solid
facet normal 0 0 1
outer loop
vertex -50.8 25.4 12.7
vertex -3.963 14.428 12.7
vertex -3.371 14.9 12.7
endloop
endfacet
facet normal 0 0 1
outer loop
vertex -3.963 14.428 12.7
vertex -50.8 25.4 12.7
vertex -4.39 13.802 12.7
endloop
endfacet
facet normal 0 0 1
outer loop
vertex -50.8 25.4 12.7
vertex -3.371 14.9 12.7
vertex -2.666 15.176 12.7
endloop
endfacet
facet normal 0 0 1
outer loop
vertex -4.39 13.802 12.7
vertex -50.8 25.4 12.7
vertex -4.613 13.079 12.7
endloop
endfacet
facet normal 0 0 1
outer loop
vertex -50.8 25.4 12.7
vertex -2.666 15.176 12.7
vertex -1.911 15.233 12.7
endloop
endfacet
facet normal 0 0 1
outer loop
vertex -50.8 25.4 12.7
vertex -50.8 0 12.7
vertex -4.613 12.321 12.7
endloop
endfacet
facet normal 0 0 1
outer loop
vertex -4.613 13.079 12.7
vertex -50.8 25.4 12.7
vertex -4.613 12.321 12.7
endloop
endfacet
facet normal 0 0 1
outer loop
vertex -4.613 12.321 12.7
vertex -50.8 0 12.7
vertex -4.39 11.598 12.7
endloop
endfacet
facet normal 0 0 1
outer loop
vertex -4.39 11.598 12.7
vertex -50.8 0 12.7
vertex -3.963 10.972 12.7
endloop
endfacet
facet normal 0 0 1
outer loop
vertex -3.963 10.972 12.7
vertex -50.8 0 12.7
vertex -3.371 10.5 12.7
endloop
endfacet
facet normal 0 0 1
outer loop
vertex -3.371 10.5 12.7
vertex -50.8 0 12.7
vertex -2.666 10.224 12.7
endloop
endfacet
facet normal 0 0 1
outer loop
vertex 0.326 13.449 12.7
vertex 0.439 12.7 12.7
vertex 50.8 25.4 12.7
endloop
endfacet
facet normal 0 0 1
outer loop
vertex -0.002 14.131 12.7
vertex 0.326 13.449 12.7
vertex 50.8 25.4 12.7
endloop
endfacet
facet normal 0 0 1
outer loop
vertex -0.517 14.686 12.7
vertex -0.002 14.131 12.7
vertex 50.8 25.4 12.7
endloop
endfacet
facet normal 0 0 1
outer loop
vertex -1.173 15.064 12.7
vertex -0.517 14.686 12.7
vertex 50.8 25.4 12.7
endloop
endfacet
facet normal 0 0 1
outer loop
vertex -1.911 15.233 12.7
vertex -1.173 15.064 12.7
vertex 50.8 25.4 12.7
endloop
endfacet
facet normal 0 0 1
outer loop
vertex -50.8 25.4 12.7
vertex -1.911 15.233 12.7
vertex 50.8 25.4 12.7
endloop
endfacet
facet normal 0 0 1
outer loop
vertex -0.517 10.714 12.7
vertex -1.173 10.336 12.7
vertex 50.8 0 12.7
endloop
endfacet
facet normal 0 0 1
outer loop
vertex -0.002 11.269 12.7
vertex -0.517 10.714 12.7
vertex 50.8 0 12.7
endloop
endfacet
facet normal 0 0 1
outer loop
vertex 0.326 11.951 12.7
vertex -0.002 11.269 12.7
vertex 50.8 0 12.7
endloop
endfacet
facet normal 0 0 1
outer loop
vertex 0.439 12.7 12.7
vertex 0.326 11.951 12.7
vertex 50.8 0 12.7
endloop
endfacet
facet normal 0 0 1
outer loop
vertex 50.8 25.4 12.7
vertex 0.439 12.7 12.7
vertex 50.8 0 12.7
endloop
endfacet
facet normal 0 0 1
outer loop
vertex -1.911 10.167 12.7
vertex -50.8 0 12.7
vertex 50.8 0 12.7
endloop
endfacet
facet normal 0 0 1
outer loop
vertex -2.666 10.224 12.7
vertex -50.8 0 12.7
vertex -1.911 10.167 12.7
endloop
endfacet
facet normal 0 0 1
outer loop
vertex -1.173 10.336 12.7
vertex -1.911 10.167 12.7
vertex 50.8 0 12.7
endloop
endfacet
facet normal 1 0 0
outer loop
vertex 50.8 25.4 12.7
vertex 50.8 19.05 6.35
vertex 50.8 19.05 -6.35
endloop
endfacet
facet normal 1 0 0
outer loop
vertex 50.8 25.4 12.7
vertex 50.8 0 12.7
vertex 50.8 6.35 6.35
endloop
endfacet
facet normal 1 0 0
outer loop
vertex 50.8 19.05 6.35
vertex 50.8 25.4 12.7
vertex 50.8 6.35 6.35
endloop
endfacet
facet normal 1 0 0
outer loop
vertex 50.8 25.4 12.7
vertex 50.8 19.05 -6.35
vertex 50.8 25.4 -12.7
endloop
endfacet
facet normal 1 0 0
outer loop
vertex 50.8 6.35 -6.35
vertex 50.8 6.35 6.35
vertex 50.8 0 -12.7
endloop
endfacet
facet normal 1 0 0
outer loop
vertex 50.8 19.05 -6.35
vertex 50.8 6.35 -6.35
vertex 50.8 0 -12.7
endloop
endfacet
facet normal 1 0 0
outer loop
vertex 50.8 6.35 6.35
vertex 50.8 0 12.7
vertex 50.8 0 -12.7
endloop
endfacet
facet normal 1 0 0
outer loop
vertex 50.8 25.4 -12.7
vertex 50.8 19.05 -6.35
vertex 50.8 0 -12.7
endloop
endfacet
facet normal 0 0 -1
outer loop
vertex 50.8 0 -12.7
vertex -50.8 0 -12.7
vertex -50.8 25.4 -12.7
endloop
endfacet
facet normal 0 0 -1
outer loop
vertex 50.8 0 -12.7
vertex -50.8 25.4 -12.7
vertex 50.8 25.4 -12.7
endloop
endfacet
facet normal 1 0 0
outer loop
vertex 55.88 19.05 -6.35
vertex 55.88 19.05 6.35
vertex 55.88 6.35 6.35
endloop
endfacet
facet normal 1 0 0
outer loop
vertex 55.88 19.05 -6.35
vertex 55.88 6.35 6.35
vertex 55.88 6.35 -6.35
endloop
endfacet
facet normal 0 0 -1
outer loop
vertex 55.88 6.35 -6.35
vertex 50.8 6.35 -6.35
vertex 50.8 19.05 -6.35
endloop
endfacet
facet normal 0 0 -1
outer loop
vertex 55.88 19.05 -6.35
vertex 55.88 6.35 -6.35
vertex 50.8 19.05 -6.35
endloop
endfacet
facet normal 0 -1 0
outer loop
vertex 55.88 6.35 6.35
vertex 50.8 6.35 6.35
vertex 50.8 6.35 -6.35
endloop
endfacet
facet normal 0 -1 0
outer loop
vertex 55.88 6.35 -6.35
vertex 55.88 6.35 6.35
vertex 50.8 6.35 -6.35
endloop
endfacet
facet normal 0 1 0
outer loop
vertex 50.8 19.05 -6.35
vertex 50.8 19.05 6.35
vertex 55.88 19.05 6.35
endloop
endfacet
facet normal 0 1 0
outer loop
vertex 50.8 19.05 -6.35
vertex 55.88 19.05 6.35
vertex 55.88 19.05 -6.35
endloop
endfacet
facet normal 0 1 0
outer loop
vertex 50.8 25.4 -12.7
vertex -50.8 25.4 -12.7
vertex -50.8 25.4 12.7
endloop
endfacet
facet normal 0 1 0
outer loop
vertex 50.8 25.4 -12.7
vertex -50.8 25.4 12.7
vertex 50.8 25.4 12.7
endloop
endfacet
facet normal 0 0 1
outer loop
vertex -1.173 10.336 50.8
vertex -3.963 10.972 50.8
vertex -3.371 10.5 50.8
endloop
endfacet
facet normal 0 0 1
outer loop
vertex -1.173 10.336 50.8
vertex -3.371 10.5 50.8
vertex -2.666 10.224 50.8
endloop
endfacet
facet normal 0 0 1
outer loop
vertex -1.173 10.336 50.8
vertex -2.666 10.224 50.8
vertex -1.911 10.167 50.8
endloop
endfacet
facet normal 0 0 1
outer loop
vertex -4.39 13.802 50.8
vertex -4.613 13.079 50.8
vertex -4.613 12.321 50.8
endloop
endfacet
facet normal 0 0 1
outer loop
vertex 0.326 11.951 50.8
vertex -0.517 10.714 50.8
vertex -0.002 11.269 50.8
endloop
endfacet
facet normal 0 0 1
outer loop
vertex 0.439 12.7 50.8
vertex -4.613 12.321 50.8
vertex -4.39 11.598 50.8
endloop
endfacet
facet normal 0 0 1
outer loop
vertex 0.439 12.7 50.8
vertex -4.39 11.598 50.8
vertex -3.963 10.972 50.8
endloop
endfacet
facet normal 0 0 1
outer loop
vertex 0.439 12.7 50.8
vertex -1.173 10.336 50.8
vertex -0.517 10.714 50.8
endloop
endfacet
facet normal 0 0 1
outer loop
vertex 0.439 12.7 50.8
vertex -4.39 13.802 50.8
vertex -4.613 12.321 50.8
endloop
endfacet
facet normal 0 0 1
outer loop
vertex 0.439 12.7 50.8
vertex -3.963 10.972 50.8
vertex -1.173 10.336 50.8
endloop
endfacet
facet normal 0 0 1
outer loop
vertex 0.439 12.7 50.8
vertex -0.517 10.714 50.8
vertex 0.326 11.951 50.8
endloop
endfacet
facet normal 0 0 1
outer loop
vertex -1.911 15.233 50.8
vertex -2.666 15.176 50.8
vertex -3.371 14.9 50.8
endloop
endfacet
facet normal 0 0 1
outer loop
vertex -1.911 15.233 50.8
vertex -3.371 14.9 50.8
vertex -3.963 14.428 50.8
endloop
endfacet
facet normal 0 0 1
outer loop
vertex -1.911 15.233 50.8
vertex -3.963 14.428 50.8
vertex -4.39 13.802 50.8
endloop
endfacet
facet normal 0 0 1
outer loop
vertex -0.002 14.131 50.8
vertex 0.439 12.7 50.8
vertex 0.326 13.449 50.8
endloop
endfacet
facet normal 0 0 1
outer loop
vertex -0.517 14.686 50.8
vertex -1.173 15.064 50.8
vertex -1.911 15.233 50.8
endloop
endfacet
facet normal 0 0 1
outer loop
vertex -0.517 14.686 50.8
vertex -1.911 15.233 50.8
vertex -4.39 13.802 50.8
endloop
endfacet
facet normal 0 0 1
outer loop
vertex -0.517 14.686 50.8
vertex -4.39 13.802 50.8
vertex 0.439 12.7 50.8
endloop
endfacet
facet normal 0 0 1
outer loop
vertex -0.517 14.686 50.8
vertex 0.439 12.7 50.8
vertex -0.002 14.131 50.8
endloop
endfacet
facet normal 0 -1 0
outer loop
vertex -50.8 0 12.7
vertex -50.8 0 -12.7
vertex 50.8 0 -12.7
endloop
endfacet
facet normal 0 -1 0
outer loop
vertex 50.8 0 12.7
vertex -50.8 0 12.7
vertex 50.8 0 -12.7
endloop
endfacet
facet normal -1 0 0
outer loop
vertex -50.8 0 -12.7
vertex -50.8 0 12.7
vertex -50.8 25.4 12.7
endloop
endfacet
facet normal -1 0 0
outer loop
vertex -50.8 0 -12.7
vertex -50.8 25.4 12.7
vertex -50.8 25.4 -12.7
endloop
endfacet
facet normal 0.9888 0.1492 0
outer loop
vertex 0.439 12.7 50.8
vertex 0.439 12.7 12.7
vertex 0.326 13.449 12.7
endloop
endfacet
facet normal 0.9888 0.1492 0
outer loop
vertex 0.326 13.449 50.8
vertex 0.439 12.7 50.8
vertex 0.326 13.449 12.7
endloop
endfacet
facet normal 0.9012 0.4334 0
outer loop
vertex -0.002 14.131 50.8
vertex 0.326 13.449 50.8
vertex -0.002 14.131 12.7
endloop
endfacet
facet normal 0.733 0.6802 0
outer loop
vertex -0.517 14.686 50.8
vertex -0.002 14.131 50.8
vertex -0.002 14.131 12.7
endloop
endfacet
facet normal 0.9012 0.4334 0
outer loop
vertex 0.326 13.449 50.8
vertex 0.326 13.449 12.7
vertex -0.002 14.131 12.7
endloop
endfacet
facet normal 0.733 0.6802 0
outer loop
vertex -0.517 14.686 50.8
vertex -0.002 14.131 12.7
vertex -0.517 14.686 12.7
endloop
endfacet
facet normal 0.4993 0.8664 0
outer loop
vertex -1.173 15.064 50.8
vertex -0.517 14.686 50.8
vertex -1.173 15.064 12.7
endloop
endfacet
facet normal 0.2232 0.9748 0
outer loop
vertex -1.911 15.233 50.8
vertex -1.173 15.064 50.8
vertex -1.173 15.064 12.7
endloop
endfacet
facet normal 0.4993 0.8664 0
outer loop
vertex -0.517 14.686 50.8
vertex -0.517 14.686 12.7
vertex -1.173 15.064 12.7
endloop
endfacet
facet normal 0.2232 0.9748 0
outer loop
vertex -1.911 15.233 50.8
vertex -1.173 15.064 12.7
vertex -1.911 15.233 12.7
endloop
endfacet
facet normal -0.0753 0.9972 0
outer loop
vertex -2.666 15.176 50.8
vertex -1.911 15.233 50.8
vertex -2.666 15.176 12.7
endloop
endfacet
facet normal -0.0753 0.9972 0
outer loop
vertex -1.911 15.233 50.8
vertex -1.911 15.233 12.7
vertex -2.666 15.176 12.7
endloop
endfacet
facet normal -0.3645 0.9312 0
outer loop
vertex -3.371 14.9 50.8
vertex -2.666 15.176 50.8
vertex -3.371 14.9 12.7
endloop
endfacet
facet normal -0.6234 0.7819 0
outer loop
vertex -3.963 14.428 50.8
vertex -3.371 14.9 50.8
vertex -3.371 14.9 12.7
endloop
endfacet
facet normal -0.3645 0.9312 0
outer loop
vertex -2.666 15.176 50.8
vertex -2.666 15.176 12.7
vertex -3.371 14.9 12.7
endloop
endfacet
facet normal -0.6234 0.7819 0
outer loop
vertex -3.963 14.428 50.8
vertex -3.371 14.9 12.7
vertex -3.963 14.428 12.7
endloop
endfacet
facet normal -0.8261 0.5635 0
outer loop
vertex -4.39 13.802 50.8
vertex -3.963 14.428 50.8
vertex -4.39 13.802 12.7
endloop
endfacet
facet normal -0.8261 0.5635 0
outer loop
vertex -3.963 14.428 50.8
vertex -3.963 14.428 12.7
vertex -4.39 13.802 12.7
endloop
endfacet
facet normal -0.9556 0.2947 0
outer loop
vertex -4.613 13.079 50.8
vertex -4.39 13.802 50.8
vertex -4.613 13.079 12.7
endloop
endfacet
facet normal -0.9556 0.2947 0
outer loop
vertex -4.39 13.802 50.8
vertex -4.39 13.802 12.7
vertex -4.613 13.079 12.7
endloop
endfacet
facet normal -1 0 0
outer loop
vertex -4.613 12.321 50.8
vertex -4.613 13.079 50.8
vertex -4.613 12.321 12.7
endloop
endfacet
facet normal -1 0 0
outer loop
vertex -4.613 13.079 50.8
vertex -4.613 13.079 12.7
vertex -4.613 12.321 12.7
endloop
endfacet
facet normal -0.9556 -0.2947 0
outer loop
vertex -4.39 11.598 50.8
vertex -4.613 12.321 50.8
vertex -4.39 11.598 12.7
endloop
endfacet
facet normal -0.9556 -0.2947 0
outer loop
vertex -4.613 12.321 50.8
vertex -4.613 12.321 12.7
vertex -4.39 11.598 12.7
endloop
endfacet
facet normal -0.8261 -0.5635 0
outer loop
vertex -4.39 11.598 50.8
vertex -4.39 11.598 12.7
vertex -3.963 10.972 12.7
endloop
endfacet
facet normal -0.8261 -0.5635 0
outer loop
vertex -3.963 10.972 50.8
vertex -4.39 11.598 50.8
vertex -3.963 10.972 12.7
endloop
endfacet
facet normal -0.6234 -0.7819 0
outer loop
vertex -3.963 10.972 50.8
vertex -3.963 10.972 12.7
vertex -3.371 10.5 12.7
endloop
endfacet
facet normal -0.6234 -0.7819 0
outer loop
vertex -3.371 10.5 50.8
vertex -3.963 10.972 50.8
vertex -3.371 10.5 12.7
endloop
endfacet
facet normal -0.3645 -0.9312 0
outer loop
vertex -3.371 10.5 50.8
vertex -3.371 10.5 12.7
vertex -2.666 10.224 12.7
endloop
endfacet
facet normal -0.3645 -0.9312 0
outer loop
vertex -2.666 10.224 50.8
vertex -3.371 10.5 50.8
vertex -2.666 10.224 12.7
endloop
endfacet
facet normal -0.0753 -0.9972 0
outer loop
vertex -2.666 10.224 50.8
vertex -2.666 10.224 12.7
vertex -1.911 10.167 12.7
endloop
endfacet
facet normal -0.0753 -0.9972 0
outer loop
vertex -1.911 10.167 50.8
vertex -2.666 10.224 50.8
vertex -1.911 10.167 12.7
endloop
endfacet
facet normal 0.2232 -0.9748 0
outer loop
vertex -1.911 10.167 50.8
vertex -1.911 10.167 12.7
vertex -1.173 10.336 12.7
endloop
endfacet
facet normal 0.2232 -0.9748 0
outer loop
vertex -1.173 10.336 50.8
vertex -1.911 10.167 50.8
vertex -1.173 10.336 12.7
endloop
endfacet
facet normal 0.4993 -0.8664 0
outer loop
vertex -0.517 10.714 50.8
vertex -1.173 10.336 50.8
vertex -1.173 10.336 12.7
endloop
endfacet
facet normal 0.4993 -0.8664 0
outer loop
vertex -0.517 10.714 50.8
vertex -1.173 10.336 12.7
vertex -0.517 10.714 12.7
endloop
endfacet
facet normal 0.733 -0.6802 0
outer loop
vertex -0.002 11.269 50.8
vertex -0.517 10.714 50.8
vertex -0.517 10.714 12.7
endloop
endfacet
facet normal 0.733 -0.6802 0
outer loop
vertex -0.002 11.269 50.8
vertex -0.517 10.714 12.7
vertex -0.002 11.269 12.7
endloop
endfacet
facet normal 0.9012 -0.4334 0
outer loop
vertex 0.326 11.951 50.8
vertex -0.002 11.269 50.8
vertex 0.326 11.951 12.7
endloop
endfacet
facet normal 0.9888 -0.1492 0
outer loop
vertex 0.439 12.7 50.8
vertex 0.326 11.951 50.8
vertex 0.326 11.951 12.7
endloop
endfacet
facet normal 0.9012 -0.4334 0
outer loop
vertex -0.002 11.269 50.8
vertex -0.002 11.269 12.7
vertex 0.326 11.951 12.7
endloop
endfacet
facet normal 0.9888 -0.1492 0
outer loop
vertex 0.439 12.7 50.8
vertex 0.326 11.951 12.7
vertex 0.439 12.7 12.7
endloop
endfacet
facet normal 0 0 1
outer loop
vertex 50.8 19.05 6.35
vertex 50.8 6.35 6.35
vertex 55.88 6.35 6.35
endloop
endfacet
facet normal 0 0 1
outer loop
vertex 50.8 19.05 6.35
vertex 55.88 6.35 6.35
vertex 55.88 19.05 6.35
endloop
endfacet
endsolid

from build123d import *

# Parameters (mm, degrees)
SKETCH1_W           = 101.6
SKETCH1_H           = 25.4
BOSS_EXTRUDE1_DEPTH = 25.4
SKETCH2_W           = 12.7
SKETCH2_H           = 12.7
BOSS_EXTRUDE2_DEPTH = 5.08
SKETCH6_R           = 2.54
BOSS_EXTRUDE4_DEPTH = 38.1


with BuildPart() as part:
    # Sketch1 → Boss-Extrude1 (new body)
    with BuildSketch(Plane(origin=(0, 0, 0), x_dir=(1, 0, 0), z_dir=(0, 1, 0))):
        Rectangle(SKETCH1_W, SKETCH1_H)
    extrude(amount=BOSS_EXTRUDE1_DEPTH)

    # Sketch2 → Boss-Extrude2 (add)
    with BuildSketch(Plane(origin=(50.8, 0, 0), x_dir=(0, 0, -1), z_dir=(1, 0, 0))):
        with Locations((0, 12.7)):
            Rectangle(SKETCH2_W, SKETCH2_H)
    extrude(amount=BOSS_EXTRUDE2_DEPTH)

    # Sketch6 → Boss-Extrude4 (add)
    with BuildSketch(Plane.XY.offset(12.7)):
        with Locations((-2.101074924, 12.7)):
            Circle(SKETCH6_R)
    extrude(amount=BOSS_EXTRUDE4_DEPTH)


solid = part.part
